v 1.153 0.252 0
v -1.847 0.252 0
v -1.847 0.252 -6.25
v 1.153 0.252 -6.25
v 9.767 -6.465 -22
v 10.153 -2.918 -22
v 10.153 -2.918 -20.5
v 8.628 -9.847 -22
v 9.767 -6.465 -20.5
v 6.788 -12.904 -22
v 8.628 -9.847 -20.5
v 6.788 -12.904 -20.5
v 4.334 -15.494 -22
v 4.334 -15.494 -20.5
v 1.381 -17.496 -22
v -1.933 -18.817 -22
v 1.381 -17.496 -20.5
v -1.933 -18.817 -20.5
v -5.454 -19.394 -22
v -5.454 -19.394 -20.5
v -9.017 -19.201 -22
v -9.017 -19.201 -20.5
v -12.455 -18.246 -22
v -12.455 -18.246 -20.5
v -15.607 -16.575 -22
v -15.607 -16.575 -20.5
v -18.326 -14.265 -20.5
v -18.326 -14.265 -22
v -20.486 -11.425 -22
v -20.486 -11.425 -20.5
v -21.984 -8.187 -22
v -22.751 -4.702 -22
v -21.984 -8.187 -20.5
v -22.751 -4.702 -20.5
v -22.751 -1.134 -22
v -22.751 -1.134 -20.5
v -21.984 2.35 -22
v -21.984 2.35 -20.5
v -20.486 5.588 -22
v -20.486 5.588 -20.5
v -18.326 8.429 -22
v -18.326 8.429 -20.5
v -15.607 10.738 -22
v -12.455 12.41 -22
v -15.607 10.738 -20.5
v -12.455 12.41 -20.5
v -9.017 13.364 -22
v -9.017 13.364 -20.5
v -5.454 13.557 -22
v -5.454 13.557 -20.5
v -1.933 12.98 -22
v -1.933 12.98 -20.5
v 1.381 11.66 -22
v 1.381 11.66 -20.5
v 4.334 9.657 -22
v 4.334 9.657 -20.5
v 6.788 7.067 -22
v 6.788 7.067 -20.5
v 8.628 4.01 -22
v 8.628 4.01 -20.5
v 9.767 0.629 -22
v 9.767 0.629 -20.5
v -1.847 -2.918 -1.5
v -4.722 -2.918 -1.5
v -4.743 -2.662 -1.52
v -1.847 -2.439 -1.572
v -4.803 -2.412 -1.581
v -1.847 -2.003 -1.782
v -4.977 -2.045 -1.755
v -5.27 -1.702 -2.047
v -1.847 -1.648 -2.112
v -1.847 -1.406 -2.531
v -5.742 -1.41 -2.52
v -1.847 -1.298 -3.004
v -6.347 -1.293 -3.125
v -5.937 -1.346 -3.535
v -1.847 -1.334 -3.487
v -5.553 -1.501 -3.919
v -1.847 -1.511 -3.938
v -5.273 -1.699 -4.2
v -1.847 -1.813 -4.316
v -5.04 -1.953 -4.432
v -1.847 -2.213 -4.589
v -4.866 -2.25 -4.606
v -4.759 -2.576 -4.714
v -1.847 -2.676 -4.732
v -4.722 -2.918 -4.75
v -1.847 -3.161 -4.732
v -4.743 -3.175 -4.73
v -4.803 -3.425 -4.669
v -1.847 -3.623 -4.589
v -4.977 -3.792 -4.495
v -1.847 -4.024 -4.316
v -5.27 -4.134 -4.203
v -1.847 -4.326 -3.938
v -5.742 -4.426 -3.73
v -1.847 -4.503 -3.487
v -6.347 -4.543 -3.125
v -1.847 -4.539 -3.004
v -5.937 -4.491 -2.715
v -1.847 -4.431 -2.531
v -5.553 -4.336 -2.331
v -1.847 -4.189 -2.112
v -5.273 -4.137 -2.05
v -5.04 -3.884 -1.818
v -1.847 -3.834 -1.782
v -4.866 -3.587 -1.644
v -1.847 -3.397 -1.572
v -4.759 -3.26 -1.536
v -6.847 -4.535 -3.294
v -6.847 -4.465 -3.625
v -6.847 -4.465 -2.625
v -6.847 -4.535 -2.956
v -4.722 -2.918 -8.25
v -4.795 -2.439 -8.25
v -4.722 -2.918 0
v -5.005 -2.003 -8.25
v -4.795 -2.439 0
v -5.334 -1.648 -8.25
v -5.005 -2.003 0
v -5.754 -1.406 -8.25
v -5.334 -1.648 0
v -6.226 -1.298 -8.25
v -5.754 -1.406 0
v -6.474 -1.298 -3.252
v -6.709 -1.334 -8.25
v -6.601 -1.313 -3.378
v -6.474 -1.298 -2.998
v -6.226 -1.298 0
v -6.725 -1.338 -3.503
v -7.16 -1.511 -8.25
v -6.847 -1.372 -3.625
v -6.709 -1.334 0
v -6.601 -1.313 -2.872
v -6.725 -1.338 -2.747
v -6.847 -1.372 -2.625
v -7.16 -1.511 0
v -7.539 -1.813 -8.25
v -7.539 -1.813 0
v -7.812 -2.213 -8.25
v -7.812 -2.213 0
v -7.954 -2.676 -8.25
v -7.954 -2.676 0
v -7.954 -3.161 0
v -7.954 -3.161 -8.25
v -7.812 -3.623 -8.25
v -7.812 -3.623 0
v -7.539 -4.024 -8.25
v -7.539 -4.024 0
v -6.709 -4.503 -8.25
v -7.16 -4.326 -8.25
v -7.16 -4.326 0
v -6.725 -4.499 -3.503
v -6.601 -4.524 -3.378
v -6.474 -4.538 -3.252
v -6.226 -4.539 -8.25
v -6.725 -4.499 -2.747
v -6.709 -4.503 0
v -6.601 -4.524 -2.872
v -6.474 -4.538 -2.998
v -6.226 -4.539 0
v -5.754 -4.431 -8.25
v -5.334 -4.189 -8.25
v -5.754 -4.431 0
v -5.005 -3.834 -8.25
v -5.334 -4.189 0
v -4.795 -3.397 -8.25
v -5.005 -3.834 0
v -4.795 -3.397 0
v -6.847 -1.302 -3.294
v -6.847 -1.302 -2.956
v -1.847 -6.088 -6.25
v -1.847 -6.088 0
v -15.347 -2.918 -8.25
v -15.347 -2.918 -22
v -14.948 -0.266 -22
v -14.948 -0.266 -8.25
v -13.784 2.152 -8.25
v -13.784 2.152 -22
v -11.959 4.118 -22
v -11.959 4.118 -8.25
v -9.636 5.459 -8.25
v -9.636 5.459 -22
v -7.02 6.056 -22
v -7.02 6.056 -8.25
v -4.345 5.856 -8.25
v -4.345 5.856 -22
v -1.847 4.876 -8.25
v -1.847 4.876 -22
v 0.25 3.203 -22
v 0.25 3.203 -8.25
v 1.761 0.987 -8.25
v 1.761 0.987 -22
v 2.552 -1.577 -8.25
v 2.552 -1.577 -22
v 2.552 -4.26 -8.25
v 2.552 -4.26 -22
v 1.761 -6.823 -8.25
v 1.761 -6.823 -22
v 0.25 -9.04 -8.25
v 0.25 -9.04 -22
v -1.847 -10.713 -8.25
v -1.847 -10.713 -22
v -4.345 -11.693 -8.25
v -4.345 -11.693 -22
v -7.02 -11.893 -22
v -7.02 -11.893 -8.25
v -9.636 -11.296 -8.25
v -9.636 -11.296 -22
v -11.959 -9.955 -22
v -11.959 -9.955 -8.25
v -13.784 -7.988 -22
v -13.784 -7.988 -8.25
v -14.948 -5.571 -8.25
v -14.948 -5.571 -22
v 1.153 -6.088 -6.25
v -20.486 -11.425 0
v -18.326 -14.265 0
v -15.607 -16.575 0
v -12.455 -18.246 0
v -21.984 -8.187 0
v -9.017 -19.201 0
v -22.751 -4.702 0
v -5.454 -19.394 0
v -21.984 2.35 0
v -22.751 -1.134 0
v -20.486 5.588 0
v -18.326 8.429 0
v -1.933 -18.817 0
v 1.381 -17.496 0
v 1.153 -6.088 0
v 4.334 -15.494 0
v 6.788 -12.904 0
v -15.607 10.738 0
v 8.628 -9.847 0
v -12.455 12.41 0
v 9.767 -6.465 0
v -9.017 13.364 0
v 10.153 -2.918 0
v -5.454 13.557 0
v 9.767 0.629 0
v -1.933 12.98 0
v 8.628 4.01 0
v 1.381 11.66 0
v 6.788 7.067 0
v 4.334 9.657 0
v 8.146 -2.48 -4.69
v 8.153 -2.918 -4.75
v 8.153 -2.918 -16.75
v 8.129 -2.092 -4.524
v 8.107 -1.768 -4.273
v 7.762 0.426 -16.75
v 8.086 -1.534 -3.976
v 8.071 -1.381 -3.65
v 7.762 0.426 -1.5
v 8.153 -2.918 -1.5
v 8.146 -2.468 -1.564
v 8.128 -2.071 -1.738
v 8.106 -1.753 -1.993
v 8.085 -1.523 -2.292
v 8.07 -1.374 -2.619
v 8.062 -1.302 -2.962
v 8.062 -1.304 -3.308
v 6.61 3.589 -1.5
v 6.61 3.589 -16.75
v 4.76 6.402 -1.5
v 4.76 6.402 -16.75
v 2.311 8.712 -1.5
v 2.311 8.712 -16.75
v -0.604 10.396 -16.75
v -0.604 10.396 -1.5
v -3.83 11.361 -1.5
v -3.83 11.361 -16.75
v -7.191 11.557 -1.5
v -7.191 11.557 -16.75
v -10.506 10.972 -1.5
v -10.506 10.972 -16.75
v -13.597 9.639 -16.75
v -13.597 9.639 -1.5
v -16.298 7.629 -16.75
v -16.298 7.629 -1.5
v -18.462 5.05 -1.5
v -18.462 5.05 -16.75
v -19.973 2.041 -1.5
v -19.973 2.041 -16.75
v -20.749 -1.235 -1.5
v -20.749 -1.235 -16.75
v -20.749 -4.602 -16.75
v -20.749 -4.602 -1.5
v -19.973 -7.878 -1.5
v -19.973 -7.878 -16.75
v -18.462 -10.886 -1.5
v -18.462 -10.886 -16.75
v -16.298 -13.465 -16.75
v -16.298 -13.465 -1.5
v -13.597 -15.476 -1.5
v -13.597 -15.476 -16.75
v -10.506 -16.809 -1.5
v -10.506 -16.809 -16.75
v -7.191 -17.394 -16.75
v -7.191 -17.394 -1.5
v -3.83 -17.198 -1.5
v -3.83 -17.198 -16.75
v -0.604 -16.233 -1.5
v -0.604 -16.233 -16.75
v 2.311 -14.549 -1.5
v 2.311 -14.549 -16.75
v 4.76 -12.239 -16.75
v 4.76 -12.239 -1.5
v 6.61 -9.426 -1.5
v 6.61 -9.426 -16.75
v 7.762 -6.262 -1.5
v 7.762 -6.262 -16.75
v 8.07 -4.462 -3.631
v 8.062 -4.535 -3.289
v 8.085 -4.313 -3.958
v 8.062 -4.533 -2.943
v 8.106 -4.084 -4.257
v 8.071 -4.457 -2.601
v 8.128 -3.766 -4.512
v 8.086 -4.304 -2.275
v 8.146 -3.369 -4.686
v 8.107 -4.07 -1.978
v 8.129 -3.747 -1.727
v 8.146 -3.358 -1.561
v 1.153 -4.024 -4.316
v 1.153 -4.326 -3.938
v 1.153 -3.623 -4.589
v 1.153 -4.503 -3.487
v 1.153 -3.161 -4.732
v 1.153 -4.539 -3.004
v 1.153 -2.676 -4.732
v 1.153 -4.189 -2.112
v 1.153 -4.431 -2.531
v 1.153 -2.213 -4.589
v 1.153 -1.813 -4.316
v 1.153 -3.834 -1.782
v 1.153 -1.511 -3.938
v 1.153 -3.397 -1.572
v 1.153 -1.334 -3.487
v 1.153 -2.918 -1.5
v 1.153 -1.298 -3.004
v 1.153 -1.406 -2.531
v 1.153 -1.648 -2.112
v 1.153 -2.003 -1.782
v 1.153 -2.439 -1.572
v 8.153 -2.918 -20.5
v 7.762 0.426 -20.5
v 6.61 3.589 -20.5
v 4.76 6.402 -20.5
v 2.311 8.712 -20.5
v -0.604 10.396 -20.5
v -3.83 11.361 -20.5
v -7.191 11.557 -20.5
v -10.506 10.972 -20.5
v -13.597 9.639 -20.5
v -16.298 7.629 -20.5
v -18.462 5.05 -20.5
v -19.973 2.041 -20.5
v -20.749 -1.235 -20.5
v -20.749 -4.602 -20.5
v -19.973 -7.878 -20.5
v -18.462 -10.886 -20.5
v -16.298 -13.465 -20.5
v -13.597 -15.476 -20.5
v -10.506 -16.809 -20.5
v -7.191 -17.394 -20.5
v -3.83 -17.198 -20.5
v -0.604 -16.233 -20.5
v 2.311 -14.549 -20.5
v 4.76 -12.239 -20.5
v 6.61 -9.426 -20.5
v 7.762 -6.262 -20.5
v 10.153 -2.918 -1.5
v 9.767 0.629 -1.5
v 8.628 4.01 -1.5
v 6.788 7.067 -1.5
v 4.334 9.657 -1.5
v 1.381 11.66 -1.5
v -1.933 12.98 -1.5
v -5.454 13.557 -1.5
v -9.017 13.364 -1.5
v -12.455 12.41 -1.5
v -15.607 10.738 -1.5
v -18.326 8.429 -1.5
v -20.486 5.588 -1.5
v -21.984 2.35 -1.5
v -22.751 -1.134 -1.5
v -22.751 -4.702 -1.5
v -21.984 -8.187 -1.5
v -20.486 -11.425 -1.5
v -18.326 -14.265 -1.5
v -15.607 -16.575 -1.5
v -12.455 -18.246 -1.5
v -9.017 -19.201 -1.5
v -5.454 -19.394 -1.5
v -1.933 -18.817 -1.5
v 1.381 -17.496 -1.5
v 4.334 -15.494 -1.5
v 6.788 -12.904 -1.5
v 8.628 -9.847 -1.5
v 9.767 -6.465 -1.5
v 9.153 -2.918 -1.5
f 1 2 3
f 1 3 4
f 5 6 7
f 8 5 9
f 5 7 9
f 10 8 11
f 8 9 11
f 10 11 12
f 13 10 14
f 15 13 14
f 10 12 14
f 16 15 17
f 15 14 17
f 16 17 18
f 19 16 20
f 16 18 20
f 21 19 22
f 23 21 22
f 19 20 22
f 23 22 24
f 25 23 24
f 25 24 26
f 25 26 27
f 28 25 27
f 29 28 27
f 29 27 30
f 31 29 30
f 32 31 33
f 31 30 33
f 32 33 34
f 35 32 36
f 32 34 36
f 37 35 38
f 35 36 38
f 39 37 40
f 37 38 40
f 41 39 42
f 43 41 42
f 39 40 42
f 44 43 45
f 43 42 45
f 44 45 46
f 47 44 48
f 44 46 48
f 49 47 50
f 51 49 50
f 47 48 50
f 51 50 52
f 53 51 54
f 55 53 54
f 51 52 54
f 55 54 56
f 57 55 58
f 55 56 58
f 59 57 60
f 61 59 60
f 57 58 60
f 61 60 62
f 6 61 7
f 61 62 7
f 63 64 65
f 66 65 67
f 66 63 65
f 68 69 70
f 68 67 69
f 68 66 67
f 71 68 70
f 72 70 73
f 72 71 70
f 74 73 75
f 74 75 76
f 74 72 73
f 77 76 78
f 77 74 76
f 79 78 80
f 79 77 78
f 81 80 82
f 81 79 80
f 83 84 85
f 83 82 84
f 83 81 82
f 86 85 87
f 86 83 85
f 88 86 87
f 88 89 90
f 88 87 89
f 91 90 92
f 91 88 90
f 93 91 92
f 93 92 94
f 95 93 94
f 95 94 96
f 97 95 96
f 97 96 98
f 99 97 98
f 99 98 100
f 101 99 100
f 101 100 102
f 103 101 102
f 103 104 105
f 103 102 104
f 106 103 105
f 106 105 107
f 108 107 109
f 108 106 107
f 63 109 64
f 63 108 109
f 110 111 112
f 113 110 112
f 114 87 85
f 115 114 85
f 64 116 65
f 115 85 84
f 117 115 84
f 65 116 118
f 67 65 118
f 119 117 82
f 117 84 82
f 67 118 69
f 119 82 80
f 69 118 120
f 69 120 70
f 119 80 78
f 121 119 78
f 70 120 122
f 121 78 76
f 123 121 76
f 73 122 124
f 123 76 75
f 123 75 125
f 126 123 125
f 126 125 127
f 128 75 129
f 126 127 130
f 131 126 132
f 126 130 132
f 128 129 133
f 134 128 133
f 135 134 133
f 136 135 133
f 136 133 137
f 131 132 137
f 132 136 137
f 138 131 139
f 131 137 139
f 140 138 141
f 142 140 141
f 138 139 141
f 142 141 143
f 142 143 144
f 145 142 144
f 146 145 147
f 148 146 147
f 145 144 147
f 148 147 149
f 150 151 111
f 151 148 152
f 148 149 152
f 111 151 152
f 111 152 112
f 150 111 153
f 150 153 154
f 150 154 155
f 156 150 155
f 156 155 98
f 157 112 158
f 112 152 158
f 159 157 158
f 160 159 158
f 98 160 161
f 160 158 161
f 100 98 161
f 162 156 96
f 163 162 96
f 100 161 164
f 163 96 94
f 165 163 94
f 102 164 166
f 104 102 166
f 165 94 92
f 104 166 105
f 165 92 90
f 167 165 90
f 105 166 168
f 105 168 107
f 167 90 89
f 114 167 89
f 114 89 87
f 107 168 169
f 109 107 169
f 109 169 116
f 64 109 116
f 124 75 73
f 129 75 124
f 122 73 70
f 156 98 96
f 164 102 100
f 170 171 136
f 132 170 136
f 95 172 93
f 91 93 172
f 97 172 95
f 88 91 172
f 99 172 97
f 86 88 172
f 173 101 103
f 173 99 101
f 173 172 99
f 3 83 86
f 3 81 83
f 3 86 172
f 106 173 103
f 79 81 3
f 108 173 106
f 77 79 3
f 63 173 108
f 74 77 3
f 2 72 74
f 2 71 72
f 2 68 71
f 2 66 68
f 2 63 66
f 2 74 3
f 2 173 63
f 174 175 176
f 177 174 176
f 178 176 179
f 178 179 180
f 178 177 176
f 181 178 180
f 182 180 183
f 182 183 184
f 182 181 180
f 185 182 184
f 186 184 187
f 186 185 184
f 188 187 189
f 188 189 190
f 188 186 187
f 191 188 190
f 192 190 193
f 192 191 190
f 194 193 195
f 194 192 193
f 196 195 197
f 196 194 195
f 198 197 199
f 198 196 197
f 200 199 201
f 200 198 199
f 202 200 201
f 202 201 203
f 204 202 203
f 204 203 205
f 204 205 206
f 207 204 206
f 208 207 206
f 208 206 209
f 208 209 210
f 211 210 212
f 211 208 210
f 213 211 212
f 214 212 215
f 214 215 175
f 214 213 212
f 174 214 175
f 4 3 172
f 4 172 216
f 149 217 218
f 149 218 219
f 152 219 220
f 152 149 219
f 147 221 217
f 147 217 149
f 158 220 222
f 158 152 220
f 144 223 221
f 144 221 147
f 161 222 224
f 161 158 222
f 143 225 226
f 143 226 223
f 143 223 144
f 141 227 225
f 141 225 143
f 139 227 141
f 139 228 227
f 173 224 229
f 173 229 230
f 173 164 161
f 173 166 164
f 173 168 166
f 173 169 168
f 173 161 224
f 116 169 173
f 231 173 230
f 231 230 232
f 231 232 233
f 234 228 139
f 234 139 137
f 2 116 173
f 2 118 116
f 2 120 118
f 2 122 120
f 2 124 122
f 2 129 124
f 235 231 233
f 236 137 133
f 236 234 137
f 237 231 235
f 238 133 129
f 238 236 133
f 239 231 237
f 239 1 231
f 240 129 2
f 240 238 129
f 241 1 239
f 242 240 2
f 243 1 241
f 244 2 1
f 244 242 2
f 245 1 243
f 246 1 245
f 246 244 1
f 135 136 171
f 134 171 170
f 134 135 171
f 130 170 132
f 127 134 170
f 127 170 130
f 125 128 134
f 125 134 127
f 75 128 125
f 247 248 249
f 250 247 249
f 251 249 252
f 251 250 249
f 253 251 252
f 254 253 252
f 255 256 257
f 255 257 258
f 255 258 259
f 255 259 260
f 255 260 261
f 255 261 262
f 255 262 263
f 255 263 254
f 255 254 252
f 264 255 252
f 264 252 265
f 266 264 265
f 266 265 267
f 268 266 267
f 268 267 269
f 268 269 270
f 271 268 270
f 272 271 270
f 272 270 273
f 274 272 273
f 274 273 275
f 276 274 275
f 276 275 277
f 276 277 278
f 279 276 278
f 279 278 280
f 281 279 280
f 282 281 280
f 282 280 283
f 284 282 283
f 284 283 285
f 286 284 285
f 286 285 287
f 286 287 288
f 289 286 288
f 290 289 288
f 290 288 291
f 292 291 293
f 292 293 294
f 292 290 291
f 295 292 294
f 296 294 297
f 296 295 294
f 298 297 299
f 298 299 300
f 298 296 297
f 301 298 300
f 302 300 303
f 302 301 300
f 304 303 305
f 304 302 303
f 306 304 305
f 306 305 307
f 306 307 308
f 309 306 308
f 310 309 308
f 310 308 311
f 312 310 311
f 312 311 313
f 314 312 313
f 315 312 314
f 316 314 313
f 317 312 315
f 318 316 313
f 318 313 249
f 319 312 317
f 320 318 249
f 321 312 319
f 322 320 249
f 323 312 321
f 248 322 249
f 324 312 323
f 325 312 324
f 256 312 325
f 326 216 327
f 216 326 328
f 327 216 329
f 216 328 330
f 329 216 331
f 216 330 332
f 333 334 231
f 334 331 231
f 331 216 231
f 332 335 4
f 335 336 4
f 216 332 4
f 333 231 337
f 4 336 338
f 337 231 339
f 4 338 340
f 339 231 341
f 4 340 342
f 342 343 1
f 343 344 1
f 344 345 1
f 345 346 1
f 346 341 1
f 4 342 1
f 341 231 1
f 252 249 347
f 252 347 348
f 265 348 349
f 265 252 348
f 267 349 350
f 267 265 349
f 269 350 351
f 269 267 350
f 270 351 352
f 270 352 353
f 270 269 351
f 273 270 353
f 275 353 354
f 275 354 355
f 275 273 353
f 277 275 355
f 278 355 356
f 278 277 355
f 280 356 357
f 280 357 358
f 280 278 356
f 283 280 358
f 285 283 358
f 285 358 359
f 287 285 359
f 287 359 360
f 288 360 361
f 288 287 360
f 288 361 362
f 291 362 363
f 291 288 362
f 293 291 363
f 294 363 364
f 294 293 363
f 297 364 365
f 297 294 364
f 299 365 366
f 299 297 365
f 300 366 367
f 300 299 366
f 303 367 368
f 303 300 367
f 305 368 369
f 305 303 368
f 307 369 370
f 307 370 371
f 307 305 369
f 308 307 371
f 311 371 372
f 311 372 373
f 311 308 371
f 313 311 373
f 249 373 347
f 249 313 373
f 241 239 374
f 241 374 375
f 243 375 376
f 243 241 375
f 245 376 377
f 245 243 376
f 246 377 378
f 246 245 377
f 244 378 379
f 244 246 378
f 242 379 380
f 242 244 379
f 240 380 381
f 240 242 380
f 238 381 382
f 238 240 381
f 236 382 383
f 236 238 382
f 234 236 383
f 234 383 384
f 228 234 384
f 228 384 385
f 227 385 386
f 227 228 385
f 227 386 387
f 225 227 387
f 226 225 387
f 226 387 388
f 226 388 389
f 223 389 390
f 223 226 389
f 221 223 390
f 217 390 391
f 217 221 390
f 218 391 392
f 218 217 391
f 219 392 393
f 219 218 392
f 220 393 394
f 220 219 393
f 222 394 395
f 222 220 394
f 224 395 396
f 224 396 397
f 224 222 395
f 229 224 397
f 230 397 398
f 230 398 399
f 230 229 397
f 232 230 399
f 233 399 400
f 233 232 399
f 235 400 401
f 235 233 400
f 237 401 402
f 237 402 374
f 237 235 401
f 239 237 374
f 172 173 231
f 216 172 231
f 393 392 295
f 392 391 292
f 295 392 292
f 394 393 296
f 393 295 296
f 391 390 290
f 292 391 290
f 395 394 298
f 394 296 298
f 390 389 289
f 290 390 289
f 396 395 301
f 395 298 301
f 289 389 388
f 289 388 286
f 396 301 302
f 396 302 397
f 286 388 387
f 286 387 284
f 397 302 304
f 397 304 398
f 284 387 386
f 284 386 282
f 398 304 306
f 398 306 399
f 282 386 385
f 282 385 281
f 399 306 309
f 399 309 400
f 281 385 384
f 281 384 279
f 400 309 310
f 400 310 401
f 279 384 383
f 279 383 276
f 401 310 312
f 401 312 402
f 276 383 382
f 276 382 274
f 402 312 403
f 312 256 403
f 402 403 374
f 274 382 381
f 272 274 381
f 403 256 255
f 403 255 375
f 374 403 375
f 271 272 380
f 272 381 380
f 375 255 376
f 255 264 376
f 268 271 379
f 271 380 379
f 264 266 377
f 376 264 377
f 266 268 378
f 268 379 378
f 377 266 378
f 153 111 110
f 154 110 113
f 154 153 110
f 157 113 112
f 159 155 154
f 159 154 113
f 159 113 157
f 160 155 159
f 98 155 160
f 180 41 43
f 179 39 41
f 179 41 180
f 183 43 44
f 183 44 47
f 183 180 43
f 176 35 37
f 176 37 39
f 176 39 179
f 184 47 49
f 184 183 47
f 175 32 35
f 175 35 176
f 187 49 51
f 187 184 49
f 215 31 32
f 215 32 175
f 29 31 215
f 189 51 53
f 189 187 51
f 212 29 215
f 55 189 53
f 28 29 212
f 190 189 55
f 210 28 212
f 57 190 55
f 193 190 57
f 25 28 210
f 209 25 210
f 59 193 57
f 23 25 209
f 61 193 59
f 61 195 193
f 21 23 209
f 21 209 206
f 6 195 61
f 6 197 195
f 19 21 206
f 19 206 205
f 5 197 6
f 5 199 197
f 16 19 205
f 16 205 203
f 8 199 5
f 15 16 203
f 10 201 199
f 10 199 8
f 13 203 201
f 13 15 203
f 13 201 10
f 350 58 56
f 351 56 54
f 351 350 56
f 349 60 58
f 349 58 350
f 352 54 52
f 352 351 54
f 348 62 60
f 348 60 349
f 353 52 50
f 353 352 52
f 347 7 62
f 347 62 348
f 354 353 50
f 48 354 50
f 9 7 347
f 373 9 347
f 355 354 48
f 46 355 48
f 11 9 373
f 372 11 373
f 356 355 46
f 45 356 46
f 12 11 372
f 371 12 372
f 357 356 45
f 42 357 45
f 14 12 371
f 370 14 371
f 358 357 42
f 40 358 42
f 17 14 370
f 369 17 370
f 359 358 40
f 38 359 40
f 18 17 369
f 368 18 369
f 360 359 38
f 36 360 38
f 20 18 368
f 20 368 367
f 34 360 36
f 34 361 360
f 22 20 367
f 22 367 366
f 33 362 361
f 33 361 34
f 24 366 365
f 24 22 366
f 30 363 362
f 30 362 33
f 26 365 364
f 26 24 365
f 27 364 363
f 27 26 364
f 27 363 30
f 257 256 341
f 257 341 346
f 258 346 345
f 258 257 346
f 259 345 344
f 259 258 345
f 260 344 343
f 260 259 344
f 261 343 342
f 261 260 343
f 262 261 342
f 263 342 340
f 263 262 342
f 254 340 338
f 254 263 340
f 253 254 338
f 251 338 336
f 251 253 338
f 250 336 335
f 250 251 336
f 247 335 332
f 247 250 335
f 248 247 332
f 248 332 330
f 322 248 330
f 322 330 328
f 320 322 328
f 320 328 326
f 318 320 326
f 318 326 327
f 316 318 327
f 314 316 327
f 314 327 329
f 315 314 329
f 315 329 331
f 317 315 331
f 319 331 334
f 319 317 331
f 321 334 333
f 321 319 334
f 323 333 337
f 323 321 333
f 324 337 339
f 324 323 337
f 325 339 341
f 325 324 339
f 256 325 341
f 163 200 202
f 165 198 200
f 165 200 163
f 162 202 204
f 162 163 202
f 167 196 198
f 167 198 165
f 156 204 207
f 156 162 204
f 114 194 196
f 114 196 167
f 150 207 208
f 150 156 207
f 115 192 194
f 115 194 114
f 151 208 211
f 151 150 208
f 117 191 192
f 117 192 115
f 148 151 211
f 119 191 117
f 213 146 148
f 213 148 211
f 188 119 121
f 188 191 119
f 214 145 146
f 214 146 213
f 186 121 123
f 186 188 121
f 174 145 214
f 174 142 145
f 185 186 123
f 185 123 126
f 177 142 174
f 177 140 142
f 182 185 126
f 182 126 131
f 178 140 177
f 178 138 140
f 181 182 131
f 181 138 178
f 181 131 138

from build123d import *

# Parameters (mm, degrees)
CROQUIS1_R                 = 15.5
CROQUIS1_R_2               = 1.5
SALIENTE_EXTRUIR1_DEPTH    = 18.25
CROQUIS2_R                 = 9
CORTAR_EXTRUIR1_DEPTH      = 10
CROQUIS3_R                 = 16.5
CROQUIS3_R_2               = 15.5
SALIENTE_EXTRUIR2_DEPTH    = 1.5
SALIENTE_EXTRUIR3_START    = -1.5
CROQUIS4_R                 = 16.5
CROQUIS4_R_2               = 15.5
SALIENTE_EXTRUIR3_DEPTH    = 1.5
CROQUIS5_W                 = 3
CROQUIS5_H                 = 6.34
CORTAR_EXTRUIR2_DEPTH      = 6.25
CORTAR_EXTRUIR3_DEPTH      = 8
CORTAR_EXTRUIR3_DEPTH_BACK = 9.75
CROQUIS7_R                 = 1.625
CROQUIS8_R                 = 1.625
CORTAR_EXTRUIR4_DEPTH      = 8.25
CORTAR_EXTRUIR7_START      = 15.25
CROQUIS9_R                 = 15.5
CROQUIS9_R_2               = 14.5
CORTAR_EXTRUIR7_DEPTH      = 15.25
CROQUIS11_R                = 16.5
CROQUIS11_R_2              = 9
SALIENTE_EXTRUIR4_DEPTH    = 3.75
CROQUIS12_R                = 16.5
CROQUIS12_R_2              = 14.5
CORTAR_EXTRUIR8_DEPTH      = 3.75


with BuildPart() as part:
    # Croquis1 → Saliente-Extruir1 (new body)
    with BuildSketch(Plane.XY):
        with Locations((-6.34746922, -2.918376653)):
            Circle(CROQUIS1_R)
        with Locations((-6.34746922, -2.918376653)):
            Circle(CROQUIS1_R_2, mode=Mode.SUBTRACT)
    extrude(amount=-SALIENTE_EXTRUIR1_DEPTH)

    # Croquis2 → Cortar-Extruir1 (cut)
    with BuildSketch(Plane(origin=(0, 0, -18.25), x_dir=(-1, 0, 0), z_dir=(0, 0, -1))):
        with Locations((6.34746922, -2.918376653)):
            Circle(CROQUIS2_R)
    extrude(amount=-CORTAR_EXTRUIR1_DEPTH, mode=Mode.SUBTRACT)

    # Croquis3 → Saliente-Extruir2 (add)
    with BuildSketch(Plane.XY):
        with Locations((-6.34746922, -2.918376653)):
            Circle(CROQUIS3_R)
        with Locations((-6.34746922, -2.918376653)):
            Circle(CROQUIS3_R_2, mode=Mode.SUBTRACT)
    extrude(amount=-SALIENTE_EXTRUIR2_DEPTH)

    # Croquis4 → Saliente-Extruir3 (add)
    with BuildSketch(Plane(origin=(0, 0, -18.25), x_dir=(-1, 0, 0), z_dir=(0, 0, -1)).offset(SALIENTE_EXTRUIR3_START)):
        with Locations(Location((6.34746922, -2.918376653, 0), (0, 0, 180))):
            Circle(CROQUIS4_R)
        with Locations(Location((6.34746922, -2.918376653, 0), (0, 0, 180))):
            Circle(CROQUIS4_R_2, mode=Mode.SUBTRACT)
    extrude(amount=SALIENTE_EXTRUIR3_DEPTH)

    # Croquis5 → Cortar-Extruir2 (cut)
    with BuildSketch(Plane.XY):
        with Locations((-0.34746922, -2.918376653)):
            Rectangle(CROQUIS5_W, CROQUIS5_H)
    extrude(amount=-CORTAR_EXTRUIR2_DEPTH, mode=Mode.SUBTRACT)

    # Croquis7 → Cortar-Extruir3 (cut, two sides: drawn at the far end of the back side and taken through both)
    with BuildSketch(Plane.ZY.offset(-1.15253078).offset(-CORTAR_EXTRUIR3_DEPTH_BACK)):
        with Locations((-3.125, -2.918376653)):
            Circle(CROQUIS7_R)
    extrude(amount=CORTAR_EXTRUIR3_DEPTH + CORTAR_EXTRUIR3_DEPTH_BACK, mode=Mode.SUBTRACT)

    # Croquis8 → Cortar-Extruir4 (cut)
    with BuildSketch(Plane.XY):
        with Locations((-6.34746922, -2.918376653)):
            Circle(CROQUIS8_R)
    extrude(amount=-CORTAR_EXTRUIR4_DEPTH, mode=Mode.SUBTRACT)

    # Croquis9 → Cortar-Extruir7 (cut)
    with BuildSketch(Plane.XY.offset(-16.75).offset(CORTAR_EXTRUIR7_START)):
        with Locations((-6.34746922, -2.918376653)):
            Circle(CROQUIS9_R)
        with Locations((-6.34746922, -2.918376653)):
            Circle(CROQUIS9_R_2, mode=Mode.SUBTRACT)
    extrude(amount=-CORTAR_EXTRUIR7_DEPTH, mode=Mode.SUBTRACT)

    # Croquis11 → Saliente-Extruir4 (add)
    with BuildSketch(Plane(origin=(0, 0, -18.25), x_dir=(-1, 0, 0), z_dir=(0, 0, -1))):
        with Locations(Location((6.34746922, -2.918376653, 0), (0, 0, 180))):
            Circle(CROQUIS11_R)
        with Locations((6.34746922, -2.918376653)):
            Circle(CROQUIS11_R_2, mode=Mode.SUBTRACT)
    extrude(amount=SALIENTE_EXTRUIR4_DEPTH)

    # Croquis12 → Cortar-Extruir8 (cut)
    with BuildSketch(Plane.XY.offset(-16.75)):
        with Locations(Location((-6.34746922, -2.918376653, 0), (0, 0, 180))):
            Circle(CROQUIS12_R)
        with Locations((-6.34746922, -2.918376653)):
            Circle(CROQUIS12_R_2, mode=Mode.SUBTRACT)
    extrude(amount=-CORTAR_EXTRUIR8_DEPTH, mode=Mode.SUBTRACT)


solid = part.part
